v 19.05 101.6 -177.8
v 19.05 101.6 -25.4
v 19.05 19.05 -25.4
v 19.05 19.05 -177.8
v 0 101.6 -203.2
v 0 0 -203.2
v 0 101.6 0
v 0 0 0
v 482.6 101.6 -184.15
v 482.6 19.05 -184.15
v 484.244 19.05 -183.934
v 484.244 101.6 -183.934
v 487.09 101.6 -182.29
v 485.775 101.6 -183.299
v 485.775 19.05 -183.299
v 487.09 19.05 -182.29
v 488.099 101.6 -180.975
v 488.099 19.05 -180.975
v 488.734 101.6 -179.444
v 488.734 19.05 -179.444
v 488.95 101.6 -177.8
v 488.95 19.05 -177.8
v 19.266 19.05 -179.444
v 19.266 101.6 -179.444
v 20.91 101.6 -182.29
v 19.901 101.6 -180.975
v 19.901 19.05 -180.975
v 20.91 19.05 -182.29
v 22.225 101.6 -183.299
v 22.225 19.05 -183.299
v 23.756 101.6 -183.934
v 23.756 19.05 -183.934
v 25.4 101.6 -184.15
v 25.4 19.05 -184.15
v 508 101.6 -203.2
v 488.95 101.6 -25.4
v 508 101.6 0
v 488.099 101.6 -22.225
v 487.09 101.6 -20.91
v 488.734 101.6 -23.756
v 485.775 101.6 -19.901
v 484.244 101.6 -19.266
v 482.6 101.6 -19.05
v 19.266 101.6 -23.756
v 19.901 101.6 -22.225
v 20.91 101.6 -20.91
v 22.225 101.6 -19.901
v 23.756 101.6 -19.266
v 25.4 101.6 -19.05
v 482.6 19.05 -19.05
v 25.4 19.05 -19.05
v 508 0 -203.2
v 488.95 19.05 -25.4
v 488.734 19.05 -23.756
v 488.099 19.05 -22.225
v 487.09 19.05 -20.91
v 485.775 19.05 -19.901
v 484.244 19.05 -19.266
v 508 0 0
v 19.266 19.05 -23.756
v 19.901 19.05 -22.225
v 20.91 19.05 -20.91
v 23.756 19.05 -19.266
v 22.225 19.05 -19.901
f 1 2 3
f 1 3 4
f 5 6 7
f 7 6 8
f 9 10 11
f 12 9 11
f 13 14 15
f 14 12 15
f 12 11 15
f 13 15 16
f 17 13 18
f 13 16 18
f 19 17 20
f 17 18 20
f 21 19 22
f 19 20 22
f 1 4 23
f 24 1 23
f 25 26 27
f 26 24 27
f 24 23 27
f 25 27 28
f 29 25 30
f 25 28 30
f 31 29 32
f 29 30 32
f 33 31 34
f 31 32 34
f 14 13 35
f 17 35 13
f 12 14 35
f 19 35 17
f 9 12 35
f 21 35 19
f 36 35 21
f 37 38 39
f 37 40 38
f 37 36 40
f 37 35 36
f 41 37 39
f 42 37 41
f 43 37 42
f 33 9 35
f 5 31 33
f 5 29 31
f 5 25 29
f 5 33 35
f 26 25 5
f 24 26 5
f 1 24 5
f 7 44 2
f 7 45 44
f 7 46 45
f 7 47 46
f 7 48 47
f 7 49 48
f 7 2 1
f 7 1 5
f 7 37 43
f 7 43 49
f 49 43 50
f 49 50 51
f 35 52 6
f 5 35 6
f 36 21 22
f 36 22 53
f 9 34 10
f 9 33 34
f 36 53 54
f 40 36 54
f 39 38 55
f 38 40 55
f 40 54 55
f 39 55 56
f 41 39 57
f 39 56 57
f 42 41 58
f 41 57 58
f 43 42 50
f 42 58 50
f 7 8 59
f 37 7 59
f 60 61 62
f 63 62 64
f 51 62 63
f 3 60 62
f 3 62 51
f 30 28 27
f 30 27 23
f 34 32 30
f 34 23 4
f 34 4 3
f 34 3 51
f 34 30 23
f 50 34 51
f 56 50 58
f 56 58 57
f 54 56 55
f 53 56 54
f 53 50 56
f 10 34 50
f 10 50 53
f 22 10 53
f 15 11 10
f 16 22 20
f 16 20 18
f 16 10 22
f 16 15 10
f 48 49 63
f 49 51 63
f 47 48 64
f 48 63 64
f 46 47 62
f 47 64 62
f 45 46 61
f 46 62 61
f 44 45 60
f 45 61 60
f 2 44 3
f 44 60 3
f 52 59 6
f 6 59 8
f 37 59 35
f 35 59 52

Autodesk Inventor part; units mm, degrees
ref_plane "YZ Plane" through (0, 0, 0) normal (1, 0, 0) x (0, 1, 0)
ref_plane "XZ Plane" through (0, 0, 0) normal (0, 1, 0) x (-1, 0, 0)
ref_plane "XY Plane" through (0, 0, 0) normal (0, 0, 1) x (1, 0, 0)
sketch "Sketch4" plane through (0, 0, 0) normal (0, 1, 0) x (-1, 0, 0)
  line L0 (0, 0) -> (-508, 0)
  line L1 (-508, 0) -> (-508, -203.2)
  line L2 (-508, -203.2) -> (0, -203.2)
  line L3 (0, -203.2) -> (0, 0)
  line L4 (0, 0) -> (-19.05, 0)
  dimension "d14" = 508
  dimension "d15" = 203.2
  dimension "d16" = 19.05
extrude "Extrusion3" add sketch "Sketch4" along normal blind 101.6
sketch "Sketch5" plane through (0, 101.6, 0) normal (0, 1, 0) x (1, 0, 0)
  line L0 (0, 0) -> (508, 0) projected
  line L1 (508, 203.2) -> (0, 203.2) projected
  line L2 (0, 0) -> (19.05, 0)
  line L3 (19.05, 19.05) -> (19.05, 184.15)
  line L4 (19.05, 184.15) -> (488.95, 184.15)
  line L5 (488.95, 184.15) -> (488.95, 19.05)
  line L6 (488.95, 19.05) -> (19.05, 19.05)
  dimension "d21" = 165.1
  dimension "d22" = 469.9
  dimension "d23" = 165.1
extrude "Extrusion4" cut sketch "Sketch5" against normal blind 82.55
fillet "Fillet5" radius 6.35 1 edges at (488.95, 60.325, -184.15)
fillet "Fillet6" radius 6.35 1 edges at (19.05, 60.325, -184.15)
fillet "Fillet7" radius 6.35 1 edges at (19.05, 60.325, -19.05)
fillet "Fillet8" radius 6.35 1 edges at (488.95, 60.325, -19.05)
properties part number "Box" material "Acetal Resin, Black"
